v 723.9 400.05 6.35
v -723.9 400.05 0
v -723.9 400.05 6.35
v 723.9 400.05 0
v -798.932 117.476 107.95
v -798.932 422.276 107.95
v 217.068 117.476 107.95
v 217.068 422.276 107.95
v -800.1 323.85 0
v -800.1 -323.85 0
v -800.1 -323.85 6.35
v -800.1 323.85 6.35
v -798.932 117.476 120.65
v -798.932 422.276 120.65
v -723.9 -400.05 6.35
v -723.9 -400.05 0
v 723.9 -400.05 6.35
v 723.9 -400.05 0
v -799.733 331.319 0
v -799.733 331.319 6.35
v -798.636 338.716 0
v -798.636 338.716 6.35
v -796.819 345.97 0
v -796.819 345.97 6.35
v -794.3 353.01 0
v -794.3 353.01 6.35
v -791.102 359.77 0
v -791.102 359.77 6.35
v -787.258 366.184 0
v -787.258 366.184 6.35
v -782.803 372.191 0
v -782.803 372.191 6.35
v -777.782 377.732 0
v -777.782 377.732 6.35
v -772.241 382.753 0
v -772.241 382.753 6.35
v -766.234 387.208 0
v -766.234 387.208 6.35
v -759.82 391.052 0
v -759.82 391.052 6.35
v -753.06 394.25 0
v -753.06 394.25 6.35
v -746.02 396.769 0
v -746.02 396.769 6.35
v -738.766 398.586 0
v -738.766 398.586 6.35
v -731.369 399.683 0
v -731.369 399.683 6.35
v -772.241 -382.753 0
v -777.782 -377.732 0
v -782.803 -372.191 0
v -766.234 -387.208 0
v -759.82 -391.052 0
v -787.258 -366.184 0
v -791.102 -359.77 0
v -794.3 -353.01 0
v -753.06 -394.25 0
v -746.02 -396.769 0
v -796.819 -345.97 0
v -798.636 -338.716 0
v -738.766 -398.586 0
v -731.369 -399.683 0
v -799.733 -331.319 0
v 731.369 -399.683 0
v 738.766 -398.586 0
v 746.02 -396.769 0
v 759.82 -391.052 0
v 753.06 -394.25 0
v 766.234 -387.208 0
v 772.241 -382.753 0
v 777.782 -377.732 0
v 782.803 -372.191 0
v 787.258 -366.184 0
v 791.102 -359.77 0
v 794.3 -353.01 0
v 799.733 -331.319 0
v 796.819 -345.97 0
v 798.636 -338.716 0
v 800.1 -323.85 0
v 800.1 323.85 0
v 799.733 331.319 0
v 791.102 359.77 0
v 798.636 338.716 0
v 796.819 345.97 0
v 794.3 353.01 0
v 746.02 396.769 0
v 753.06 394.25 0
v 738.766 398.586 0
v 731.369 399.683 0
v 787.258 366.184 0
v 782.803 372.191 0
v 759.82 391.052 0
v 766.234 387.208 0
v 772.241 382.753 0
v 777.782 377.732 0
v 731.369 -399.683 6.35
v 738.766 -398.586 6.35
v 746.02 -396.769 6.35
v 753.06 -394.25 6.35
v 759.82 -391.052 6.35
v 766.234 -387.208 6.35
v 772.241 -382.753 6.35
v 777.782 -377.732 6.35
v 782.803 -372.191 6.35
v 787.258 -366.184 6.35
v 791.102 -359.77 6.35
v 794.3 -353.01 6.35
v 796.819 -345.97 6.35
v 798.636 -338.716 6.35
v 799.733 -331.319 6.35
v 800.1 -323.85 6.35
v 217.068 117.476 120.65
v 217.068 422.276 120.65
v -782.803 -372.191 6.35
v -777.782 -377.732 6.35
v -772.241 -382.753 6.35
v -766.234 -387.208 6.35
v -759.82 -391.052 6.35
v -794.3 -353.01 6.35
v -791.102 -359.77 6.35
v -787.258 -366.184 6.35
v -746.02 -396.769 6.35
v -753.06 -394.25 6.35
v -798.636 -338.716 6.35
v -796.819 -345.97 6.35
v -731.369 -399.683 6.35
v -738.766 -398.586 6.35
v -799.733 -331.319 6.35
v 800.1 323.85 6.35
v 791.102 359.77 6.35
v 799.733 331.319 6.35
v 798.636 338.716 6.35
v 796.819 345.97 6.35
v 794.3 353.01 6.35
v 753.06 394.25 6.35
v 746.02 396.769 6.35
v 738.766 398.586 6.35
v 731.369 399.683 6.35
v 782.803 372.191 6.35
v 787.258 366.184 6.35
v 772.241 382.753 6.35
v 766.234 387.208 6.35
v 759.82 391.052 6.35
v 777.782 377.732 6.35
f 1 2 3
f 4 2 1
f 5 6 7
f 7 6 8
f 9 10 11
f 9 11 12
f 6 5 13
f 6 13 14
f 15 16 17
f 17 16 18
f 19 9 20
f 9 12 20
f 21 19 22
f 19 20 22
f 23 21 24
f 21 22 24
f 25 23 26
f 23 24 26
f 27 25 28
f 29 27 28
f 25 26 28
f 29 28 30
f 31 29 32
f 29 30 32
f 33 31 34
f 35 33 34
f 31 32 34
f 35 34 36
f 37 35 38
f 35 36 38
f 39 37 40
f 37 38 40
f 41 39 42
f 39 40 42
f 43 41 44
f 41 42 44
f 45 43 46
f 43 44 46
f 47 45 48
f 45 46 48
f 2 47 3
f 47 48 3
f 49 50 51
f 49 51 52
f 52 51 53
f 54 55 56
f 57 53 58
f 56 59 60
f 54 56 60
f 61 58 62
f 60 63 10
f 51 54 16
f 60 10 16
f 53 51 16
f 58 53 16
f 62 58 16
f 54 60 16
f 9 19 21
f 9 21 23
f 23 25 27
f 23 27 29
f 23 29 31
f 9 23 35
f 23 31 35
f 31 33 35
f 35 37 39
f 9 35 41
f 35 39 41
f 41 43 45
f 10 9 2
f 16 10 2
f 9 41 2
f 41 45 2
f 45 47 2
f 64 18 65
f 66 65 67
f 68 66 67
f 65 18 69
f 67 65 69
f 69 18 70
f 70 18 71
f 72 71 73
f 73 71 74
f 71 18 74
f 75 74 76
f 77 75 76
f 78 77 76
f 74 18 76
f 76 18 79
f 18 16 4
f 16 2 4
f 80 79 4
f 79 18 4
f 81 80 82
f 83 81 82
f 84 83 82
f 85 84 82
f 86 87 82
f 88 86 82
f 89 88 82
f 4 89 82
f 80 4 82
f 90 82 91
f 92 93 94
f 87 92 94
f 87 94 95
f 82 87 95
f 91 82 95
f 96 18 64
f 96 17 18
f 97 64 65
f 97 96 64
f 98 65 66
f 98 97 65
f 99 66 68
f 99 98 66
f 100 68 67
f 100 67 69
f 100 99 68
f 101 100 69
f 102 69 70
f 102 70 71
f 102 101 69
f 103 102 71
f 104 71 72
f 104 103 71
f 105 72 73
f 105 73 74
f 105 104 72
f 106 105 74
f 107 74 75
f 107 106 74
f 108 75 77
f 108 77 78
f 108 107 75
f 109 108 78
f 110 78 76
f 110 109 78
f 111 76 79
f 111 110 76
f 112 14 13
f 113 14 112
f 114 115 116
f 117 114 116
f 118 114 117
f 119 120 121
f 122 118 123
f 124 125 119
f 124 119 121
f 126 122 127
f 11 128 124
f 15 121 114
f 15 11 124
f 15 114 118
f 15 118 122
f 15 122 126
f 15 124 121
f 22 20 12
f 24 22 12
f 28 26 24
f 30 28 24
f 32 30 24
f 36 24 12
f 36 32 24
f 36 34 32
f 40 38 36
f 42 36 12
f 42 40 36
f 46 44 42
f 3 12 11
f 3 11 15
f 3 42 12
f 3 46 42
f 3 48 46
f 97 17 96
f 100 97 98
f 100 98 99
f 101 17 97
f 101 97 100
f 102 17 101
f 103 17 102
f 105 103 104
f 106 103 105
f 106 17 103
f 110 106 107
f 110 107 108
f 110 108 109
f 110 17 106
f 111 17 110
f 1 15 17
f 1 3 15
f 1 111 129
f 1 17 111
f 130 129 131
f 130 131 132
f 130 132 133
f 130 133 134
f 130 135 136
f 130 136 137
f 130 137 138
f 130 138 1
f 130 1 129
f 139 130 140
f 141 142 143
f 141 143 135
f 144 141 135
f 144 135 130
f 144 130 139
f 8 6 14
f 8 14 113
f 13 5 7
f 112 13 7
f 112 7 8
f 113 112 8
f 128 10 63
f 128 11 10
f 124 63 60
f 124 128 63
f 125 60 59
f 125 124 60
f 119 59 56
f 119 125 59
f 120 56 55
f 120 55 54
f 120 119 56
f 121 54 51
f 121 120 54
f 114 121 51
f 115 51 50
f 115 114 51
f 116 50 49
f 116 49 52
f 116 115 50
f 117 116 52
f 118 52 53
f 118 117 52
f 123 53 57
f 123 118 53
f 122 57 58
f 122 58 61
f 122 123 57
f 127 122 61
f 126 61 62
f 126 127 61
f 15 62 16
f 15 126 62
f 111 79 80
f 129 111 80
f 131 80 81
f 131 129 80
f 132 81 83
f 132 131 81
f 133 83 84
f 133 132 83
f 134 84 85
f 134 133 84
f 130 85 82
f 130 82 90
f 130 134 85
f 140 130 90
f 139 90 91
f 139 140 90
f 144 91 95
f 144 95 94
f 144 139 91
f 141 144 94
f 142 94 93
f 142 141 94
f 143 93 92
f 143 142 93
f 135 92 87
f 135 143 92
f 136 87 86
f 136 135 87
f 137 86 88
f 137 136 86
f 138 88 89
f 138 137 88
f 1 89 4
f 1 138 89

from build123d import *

# Parameters (mm, degrees)
F0_W     = 1600.2
F0_H     = 800.1
F1_DEPTH = 6.35
F2_R     = 76.2
F4_W     = 1016
F4_H     = 304.8
F5_DEPTH = 12.7


with BuildPart() as f1:
    # F0 (on Top) → F1 (new body)
    with BuildSketch(Plane.XY):
        Rectangle(F0_W, F0_H)
    extrude(amount=F1_DEPTH)

    # F2
    f2_edges = [f1.edges().sort_by_distance(p)[0] for p in [
        (-800.1, -400.05, 3.175),
        (800.1, -400.05, 3.175),
        (-800.1, 400.05, 3.175),
        (800.1, 400.05, 3.175),
    ]]
    fillet(f2_edges, radius=F2_R)


with BuildPart() as f5:
    # F4 (on offset) → F5 (new body)
    with BuildSketch(Plane.XY.offset(107.95)):
        with Locations((-290.932076, 269.875688)):
            Rectangle(F4_W, F4_H)
    extrude(amount=F5_DEPTH)


solid = Compound([f1.part, f5.part])
